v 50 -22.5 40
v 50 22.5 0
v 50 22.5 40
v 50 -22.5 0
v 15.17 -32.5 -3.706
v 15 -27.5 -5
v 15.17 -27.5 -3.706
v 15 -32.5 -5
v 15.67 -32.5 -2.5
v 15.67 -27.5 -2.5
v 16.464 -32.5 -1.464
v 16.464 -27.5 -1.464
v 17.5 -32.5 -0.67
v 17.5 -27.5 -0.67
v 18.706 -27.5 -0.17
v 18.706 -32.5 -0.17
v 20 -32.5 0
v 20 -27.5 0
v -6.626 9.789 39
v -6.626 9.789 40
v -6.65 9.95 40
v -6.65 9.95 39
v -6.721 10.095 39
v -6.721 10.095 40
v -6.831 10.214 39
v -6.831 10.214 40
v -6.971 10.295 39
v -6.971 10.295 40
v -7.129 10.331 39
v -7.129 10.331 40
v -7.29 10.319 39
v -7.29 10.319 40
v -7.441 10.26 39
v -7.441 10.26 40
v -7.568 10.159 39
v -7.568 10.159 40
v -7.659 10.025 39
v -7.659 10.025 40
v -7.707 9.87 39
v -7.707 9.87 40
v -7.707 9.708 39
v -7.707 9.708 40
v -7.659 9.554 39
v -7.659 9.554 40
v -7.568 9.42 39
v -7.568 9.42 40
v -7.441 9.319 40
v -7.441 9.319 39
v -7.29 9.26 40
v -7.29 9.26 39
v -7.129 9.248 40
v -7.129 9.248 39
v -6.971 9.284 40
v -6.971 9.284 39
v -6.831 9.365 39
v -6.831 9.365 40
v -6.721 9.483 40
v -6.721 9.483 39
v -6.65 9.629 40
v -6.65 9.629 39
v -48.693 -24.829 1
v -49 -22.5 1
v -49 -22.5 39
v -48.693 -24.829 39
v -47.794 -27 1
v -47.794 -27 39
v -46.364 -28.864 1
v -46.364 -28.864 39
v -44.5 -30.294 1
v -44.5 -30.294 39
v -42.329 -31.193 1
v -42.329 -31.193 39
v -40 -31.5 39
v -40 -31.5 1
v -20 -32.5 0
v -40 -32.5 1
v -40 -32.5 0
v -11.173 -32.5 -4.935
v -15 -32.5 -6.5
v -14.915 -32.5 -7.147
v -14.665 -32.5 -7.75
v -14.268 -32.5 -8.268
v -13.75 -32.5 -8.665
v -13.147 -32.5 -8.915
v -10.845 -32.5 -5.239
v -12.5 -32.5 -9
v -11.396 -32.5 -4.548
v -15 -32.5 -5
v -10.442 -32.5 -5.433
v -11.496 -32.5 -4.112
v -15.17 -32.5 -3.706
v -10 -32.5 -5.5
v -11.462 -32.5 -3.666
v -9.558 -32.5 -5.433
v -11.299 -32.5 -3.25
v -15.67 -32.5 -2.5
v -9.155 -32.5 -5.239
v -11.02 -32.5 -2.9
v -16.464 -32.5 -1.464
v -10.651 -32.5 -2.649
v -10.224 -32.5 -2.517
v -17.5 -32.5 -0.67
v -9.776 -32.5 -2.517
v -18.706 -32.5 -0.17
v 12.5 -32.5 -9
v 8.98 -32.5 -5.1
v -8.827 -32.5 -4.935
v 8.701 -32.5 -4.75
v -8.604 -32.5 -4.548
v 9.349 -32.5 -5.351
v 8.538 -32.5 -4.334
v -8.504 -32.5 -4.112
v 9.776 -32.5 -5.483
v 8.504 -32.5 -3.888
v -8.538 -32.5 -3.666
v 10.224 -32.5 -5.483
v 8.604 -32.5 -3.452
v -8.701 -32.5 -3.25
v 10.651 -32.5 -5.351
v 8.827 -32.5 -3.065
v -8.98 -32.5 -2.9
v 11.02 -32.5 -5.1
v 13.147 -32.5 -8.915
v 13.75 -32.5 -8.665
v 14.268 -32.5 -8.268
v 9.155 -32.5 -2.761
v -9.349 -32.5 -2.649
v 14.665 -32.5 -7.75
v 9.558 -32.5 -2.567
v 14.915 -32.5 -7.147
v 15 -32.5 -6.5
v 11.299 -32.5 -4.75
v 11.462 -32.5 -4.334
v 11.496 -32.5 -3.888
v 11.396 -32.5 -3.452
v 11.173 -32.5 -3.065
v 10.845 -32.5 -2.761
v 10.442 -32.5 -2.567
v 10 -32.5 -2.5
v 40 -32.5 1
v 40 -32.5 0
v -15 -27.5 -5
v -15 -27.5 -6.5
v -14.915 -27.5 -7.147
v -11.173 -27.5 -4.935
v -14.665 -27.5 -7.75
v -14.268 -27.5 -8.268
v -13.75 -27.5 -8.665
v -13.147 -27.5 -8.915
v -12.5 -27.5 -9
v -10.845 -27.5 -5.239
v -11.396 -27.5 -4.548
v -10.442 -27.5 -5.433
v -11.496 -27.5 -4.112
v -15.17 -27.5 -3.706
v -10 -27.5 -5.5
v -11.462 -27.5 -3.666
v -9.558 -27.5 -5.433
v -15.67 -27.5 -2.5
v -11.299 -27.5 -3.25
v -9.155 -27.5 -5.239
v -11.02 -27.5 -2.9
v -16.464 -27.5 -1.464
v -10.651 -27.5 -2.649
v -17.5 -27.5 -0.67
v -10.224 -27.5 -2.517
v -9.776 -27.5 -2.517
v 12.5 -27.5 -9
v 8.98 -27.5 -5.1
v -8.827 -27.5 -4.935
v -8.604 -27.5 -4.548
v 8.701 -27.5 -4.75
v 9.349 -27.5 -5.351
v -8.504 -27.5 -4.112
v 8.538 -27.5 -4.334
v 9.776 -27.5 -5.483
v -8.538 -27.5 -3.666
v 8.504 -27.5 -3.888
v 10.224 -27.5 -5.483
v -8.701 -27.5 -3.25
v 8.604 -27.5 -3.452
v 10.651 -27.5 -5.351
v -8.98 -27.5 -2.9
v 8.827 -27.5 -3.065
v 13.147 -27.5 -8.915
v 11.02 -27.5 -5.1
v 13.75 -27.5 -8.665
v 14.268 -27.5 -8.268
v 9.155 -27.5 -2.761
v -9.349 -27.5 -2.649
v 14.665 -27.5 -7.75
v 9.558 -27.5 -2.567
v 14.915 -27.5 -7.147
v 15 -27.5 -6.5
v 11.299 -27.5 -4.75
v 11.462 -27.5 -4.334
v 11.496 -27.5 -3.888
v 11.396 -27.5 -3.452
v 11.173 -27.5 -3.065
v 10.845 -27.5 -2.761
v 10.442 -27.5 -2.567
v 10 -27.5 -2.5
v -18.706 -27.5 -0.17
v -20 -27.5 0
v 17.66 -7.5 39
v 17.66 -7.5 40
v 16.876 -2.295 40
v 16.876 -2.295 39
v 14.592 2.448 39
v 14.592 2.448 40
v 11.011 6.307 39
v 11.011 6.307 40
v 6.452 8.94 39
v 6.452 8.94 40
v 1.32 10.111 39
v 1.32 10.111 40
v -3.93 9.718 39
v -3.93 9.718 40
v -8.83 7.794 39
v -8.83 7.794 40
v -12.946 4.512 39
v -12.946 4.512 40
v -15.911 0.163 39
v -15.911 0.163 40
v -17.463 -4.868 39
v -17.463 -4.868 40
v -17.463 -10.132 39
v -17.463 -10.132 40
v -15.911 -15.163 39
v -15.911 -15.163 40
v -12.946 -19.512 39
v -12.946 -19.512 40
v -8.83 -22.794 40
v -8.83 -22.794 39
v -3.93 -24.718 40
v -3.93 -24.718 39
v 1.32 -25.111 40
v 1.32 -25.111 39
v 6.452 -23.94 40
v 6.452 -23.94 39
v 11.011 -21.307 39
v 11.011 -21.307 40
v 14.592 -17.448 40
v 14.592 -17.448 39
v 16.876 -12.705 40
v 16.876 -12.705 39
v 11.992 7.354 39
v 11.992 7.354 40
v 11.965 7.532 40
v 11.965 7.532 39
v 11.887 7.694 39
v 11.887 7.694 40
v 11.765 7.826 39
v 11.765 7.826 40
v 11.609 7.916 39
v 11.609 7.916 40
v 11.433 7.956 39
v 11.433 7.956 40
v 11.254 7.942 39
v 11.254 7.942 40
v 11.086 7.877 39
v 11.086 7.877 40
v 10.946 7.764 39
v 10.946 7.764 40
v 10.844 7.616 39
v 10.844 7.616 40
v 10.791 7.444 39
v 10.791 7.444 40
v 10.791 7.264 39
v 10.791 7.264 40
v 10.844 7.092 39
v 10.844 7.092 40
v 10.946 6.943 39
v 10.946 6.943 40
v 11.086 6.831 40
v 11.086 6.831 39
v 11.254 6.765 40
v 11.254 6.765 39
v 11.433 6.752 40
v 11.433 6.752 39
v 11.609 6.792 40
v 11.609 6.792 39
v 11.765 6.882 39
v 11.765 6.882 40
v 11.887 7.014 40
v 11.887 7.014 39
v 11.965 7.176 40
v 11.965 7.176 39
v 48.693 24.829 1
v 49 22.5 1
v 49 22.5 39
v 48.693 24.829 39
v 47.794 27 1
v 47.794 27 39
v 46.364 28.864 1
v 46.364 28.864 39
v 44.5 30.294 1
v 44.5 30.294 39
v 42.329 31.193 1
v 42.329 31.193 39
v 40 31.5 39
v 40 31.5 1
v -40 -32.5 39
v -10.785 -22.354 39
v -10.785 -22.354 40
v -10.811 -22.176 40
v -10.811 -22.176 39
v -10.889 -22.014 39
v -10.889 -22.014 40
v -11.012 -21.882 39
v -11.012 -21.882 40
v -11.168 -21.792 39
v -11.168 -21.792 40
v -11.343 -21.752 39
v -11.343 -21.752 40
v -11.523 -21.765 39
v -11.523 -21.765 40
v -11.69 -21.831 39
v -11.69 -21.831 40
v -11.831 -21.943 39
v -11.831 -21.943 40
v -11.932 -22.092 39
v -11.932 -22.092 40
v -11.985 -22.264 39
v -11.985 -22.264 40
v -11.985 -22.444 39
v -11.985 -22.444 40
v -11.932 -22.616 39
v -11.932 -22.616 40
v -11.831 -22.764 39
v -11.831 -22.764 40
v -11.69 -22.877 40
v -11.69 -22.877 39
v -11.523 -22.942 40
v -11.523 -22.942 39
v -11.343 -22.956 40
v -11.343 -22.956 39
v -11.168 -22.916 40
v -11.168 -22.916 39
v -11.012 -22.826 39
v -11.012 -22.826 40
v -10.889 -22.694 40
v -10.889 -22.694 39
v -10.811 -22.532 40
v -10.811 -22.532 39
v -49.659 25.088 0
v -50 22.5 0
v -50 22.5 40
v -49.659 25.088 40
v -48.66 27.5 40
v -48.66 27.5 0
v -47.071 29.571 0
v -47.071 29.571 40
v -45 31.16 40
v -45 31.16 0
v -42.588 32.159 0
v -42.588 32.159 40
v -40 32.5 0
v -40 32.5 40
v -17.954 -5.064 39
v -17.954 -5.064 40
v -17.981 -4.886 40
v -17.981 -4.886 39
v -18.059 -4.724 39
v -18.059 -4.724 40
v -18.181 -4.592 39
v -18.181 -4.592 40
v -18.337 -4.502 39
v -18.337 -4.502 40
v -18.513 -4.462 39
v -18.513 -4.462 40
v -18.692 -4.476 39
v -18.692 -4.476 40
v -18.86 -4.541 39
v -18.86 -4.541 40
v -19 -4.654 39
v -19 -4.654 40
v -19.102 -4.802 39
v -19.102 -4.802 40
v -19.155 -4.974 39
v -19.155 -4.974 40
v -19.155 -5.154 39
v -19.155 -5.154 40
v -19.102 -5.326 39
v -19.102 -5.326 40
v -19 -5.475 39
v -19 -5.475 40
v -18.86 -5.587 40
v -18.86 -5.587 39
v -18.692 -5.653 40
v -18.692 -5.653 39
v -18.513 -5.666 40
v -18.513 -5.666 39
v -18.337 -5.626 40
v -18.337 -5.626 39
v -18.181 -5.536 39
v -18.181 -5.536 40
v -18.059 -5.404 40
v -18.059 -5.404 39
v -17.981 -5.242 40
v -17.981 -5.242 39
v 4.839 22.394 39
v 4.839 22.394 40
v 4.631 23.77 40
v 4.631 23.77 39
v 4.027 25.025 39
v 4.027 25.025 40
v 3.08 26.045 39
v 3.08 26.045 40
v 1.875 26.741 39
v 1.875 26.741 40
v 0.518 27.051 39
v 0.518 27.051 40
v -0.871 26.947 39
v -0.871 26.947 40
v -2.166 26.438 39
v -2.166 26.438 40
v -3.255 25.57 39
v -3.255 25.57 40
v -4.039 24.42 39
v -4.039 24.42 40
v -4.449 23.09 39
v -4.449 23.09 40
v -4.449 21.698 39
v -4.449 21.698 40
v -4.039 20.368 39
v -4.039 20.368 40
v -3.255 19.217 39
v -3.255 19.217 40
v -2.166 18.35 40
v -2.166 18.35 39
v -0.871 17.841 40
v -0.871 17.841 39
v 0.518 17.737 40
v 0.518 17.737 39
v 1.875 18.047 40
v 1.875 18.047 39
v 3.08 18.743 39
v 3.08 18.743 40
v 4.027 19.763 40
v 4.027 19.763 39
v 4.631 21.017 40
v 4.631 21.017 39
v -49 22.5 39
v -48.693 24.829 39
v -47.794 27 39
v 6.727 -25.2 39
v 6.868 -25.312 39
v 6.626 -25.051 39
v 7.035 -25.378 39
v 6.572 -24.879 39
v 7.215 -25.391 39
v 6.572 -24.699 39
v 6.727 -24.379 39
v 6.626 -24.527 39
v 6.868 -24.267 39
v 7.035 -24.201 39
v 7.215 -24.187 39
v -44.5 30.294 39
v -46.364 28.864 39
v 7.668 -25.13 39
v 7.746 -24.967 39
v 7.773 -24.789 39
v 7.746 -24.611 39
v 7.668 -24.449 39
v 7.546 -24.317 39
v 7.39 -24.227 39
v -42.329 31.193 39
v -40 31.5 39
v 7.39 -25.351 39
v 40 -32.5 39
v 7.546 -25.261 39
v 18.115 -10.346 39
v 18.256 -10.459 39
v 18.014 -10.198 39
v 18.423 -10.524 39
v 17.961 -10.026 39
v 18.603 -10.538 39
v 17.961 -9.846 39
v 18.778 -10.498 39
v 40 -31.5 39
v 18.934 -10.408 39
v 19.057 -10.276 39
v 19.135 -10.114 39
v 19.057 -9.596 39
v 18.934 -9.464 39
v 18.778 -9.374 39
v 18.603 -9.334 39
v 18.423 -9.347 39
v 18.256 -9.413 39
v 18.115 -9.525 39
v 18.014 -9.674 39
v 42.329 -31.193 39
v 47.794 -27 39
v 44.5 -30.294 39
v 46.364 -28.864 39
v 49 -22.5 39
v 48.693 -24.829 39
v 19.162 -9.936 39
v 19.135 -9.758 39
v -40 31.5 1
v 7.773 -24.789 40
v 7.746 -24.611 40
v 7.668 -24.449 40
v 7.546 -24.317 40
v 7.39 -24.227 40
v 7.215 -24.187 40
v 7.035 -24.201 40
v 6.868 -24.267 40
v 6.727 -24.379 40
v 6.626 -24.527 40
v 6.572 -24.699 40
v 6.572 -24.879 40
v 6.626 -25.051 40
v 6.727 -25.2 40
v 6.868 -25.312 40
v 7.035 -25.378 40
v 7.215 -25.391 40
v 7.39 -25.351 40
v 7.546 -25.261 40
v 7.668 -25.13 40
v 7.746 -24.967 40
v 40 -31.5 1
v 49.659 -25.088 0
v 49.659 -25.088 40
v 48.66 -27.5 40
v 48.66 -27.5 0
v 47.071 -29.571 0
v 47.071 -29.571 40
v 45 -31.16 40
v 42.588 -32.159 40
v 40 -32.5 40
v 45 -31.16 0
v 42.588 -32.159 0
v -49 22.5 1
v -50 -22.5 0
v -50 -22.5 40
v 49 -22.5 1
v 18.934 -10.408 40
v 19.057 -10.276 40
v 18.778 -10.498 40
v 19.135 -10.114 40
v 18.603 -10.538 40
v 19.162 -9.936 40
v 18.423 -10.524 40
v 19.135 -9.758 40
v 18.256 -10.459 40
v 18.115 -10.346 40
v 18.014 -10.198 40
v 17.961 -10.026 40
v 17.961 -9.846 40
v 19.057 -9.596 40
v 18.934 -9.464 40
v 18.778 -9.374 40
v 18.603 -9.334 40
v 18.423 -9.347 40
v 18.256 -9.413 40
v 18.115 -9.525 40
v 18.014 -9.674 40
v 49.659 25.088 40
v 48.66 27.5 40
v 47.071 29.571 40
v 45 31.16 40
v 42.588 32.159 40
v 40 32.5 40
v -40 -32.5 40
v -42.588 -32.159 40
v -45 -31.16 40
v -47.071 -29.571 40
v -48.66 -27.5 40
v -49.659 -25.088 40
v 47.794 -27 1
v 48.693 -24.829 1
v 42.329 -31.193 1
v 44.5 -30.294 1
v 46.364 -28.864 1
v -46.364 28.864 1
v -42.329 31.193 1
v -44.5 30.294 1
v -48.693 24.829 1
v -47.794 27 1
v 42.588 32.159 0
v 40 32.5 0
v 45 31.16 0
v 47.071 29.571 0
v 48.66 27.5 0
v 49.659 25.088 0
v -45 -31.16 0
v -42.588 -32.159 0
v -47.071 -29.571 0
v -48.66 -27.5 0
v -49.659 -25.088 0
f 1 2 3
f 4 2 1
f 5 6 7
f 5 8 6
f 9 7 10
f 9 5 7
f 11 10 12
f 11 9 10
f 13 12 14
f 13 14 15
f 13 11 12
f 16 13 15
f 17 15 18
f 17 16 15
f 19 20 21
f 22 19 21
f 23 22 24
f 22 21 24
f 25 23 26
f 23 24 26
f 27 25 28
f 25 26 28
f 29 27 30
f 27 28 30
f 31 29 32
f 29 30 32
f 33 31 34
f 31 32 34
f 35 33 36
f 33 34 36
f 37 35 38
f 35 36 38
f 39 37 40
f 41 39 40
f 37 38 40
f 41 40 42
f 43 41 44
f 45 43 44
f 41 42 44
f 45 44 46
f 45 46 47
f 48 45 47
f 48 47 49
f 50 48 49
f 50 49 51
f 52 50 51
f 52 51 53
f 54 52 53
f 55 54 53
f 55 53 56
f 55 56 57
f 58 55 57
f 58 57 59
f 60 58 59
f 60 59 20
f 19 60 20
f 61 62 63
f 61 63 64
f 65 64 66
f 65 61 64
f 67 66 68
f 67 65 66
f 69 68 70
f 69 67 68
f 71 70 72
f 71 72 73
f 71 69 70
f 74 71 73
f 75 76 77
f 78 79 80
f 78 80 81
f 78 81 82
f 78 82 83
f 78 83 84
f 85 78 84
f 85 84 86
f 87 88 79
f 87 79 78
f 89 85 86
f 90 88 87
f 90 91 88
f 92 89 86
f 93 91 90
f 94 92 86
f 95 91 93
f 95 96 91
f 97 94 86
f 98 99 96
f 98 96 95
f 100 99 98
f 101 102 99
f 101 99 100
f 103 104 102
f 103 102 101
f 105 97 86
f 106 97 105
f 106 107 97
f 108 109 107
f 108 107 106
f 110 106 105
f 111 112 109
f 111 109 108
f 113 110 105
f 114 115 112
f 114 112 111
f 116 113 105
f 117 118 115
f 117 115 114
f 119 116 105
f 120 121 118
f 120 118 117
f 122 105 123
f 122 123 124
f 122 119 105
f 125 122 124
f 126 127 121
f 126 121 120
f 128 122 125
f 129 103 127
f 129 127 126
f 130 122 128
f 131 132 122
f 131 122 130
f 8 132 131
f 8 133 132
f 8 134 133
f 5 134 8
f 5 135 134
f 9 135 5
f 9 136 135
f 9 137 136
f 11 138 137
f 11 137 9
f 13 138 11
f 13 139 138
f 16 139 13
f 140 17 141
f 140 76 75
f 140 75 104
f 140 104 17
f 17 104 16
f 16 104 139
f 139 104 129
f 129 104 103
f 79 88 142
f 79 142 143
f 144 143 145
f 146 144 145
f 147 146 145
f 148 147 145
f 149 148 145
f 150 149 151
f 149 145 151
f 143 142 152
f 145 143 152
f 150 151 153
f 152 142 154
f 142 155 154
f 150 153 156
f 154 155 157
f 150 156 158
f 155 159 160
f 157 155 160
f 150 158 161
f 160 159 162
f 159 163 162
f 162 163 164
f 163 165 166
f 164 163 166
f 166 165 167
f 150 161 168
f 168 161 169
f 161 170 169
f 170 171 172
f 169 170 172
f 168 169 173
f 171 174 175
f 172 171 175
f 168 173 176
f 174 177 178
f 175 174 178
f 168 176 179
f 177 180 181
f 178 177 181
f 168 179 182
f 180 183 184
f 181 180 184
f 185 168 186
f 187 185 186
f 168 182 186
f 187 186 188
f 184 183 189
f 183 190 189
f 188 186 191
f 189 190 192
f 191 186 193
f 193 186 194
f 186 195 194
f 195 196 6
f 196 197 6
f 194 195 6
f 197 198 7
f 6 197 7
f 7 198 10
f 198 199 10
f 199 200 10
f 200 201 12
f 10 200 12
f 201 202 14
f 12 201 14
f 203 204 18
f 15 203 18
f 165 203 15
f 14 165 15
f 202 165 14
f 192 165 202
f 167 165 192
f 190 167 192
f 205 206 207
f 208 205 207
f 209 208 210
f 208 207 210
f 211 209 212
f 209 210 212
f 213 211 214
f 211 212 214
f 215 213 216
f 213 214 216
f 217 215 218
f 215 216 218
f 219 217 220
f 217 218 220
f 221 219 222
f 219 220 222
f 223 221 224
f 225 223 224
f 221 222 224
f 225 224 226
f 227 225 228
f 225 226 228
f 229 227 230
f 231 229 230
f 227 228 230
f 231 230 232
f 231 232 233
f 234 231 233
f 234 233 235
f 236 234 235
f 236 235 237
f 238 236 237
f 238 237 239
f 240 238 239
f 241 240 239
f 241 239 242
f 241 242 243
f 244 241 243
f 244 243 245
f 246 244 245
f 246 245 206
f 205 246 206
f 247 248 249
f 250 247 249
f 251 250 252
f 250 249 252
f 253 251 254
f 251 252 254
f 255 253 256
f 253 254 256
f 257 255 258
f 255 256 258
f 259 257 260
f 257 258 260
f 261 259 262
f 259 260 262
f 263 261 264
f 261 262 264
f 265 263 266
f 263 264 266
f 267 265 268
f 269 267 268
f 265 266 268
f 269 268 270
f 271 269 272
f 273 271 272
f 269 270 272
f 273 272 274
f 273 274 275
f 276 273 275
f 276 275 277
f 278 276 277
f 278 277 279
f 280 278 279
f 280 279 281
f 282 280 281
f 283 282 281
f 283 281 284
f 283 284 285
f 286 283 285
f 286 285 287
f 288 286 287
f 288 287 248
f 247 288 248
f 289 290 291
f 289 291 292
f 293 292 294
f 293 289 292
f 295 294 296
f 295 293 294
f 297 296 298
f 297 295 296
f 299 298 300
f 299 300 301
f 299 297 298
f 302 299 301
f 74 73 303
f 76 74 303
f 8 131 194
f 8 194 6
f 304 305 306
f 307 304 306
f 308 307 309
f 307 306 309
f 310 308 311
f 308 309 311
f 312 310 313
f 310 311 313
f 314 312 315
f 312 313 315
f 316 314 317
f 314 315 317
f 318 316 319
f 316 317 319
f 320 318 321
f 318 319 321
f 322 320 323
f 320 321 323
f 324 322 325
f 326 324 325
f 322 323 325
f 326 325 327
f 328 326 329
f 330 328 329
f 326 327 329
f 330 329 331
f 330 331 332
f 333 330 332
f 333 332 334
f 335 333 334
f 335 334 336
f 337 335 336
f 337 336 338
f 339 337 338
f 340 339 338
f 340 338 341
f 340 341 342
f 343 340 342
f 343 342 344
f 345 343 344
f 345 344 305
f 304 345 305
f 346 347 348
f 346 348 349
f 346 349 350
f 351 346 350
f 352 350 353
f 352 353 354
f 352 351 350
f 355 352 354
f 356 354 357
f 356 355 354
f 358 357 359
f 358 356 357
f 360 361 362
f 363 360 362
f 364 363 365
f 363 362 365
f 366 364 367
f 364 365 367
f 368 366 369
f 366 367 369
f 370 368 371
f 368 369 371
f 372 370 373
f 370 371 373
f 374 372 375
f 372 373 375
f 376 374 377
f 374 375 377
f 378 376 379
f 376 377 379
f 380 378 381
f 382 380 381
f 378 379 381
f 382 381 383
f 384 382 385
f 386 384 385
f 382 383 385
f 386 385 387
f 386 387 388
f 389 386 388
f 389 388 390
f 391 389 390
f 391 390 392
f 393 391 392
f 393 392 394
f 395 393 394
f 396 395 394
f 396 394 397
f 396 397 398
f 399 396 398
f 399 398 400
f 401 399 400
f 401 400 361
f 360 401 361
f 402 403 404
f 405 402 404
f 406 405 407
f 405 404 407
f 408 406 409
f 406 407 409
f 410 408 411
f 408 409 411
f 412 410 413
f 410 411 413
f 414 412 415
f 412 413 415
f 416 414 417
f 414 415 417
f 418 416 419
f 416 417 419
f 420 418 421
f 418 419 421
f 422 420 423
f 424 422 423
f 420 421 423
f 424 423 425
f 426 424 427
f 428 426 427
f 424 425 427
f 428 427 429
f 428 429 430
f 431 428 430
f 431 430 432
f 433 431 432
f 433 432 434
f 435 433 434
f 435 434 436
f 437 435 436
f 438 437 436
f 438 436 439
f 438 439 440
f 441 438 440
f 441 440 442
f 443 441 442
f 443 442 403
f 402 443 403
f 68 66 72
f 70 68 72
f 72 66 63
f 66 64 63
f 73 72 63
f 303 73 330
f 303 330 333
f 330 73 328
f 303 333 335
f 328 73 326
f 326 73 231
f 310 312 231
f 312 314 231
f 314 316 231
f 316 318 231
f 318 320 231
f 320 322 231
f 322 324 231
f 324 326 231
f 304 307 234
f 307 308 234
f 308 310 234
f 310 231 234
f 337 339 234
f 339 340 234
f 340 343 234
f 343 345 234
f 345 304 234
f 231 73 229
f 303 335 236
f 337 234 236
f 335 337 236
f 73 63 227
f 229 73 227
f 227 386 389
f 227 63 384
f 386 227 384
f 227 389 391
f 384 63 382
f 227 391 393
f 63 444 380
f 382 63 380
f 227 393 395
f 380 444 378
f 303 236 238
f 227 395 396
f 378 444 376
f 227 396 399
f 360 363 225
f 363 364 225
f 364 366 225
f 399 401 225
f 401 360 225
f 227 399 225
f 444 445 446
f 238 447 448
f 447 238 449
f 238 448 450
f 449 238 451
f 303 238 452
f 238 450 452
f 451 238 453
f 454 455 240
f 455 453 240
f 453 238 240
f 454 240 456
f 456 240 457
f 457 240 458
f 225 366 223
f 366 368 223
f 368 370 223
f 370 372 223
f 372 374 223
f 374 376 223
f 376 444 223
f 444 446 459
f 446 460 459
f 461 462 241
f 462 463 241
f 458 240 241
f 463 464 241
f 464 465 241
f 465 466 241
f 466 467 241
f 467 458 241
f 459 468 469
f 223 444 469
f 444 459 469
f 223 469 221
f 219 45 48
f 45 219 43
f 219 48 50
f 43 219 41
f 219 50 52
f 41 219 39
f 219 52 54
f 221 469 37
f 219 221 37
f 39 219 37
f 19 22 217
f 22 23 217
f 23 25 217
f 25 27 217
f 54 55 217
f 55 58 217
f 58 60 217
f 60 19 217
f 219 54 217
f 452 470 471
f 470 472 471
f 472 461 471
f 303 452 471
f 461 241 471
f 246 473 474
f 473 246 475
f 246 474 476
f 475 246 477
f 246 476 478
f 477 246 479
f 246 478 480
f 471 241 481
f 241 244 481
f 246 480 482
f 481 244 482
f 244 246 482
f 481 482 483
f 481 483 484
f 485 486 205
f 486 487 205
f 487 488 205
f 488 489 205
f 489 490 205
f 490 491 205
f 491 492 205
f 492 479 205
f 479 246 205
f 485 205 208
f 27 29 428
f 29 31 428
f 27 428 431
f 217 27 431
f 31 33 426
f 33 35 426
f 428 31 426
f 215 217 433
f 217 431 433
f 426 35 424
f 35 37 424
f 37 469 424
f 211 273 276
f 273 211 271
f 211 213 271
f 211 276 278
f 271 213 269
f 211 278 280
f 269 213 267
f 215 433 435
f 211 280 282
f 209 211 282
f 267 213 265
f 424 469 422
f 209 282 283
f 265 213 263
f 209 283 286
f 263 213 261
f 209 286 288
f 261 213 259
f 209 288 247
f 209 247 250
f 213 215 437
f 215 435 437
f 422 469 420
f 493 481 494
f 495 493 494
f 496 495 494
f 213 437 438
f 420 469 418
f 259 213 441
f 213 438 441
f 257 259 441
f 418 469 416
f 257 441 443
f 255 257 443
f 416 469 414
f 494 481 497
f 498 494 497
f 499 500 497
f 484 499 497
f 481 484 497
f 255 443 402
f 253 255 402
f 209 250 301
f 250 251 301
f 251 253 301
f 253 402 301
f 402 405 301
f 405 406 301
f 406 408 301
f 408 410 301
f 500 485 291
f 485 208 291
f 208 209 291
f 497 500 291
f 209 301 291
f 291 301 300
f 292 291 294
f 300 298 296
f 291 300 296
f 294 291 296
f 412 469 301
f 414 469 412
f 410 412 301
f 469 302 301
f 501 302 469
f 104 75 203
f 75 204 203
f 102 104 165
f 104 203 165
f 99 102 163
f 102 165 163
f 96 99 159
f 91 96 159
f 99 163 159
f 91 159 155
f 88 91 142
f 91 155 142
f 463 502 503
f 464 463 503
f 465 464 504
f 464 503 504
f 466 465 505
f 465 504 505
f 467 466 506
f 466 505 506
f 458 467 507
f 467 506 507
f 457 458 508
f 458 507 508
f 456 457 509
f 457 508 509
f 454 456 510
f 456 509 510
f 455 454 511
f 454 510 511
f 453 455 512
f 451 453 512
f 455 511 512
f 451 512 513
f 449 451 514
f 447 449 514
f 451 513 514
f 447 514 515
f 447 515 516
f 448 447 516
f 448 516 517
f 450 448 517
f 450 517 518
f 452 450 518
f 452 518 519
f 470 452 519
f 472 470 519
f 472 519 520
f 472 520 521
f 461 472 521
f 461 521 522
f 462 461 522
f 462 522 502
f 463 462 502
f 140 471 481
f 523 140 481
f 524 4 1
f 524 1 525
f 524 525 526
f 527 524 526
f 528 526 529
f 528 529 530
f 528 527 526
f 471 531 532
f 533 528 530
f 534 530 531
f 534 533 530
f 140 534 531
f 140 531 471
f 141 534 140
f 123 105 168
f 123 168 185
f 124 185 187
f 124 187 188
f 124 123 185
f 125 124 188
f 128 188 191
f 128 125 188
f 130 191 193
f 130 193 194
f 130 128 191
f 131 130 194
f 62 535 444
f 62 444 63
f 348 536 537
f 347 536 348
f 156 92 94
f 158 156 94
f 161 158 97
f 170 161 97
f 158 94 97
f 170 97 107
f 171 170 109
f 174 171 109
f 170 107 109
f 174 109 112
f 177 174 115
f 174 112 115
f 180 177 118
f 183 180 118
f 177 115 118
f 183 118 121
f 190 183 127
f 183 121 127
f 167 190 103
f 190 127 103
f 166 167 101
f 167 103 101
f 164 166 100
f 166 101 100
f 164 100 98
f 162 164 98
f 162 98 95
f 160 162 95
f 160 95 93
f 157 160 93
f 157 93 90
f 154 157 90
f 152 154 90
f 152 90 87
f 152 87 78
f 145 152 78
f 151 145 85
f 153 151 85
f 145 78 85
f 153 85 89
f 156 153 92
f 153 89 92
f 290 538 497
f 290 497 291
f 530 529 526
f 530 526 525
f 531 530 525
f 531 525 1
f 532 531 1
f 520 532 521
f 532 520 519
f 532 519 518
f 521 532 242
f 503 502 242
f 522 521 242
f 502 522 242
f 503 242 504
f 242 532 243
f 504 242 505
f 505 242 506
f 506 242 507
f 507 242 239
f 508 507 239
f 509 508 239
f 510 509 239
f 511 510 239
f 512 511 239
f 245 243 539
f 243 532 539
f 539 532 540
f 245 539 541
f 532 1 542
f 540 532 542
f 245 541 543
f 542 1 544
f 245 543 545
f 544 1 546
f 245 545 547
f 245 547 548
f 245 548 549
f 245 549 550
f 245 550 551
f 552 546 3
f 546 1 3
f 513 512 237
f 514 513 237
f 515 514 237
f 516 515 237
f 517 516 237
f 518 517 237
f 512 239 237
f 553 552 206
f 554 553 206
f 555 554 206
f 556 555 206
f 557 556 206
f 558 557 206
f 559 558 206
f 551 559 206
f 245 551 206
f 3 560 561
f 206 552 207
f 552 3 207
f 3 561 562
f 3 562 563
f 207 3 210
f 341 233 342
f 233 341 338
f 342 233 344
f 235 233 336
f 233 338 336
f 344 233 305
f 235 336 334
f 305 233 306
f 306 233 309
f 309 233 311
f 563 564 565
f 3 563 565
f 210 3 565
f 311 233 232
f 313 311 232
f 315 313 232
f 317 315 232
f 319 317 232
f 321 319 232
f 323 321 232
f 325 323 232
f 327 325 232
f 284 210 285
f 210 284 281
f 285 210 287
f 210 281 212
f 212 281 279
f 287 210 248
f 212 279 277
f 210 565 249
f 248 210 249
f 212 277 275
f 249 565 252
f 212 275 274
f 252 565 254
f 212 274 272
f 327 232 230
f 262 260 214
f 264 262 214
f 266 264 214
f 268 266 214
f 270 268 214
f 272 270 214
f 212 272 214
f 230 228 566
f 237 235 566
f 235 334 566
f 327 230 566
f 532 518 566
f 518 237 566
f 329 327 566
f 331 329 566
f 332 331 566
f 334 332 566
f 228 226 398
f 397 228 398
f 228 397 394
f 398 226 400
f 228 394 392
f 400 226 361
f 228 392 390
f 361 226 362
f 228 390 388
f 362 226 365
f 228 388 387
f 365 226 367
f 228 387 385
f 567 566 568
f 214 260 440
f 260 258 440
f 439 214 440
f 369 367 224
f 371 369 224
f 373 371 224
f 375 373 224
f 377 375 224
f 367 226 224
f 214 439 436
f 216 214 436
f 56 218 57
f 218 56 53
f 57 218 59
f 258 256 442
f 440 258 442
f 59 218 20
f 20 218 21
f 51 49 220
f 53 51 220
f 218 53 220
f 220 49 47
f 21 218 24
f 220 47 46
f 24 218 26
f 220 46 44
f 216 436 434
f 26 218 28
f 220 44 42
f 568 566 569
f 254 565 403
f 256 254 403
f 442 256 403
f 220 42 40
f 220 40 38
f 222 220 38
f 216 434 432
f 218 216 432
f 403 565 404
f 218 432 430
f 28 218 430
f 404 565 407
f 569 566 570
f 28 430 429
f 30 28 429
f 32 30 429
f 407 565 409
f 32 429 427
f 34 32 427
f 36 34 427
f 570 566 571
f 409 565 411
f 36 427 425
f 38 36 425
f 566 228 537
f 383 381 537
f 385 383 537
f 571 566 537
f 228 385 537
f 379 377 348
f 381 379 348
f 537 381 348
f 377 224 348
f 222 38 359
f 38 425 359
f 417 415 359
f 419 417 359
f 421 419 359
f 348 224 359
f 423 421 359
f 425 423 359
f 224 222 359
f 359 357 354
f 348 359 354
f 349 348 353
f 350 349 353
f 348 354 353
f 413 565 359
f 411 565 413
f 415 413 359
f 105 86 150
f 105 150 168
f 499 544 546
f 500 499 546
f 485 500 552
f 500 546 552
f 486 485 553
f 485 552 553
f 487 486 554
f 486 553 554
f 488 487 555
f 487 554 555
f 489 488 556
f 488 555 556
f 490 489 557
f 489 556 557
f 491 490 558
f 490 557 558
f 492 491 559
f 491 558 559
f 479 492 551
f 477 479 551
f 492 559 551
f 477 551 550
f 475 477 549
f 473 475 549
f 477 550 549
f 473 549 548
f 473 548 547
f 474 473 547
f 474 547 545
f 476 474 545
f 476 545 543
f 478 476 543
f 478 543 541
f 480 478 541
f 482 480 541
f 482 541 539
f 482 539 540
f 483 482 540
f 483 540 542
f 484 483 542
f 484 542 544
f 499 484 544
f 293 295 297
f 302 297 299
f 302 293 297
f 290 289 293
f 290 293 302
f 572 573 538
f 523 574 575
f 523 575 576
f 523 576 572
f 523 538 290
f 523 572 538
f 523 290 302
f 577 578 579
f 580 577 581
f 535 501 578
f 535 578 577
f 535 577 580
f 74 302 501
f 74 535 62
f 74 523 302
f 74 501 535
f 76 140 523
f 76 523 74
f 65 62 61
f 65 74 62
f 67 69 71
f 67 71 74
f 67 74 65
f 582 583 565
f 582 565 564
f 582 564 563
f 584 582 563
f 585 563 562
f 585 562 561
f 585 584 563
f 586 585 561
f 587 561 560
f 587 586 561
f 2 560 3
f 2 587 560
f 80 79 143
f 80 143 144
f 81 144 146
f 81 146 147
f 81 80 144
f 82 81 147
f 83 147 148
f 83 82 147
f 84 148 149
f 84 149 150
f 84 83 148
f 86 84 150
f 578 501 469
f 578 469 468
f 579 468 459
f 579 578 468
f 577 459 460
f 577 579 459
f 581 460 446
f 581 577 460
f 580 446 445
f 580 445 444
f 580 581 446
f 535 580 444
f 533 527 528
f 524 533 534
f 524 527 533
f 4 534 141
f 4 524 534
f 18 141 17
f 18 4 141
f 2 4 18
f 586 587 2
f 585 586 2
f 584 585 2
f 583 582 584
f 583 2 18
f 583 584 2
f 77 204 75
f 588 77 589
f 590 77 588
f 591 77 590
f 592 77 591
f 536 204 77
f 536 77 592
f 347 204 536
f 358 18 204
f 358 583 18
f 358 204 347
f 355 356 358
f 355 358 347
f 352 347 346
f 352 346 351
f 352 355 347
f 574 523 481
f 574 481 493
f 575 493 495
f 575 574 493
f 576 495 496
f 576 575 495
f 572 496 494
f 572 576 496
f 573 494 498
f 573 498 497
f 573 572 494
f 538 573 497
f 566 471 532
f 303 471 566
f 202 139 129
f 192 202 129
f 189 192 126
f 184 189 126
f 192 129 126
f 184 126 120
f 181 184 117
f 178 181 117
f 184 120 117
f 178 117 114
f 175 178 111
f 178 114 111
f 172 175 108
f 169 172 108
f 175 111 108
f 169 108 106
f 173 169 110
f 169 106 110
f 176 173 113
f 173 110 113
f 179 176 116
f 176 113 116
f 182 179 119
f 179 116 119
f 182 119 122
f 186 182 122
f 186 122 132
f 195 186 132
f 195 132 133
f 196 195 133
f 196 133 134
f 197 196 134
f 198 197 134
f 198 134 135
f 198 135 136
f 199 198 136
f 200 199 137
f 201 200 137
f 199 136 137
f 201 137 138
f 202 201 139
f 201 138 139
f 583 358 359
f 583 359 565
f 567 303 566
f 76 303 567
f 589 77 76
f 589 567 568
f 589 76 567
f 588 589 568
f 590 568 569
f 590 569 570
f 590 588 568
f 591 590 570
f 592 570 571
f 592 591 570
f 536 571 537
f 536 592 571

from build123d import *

# Parameters (mm, degrees)
BOSS_EXTRU_1_DEPTH      = 40
COQUE1_START            = 1
COQUE1_DEPTH            = 38
ESQUISSE2_R             = 4.67
ESQUISSE2_R_2           = 17.660377339
ESQUISSE2_R_3           = 0.603773585
ESQUISSE2_R_4           = 0.543253327
ENL_V_MAT_EXTRU_1_DEPTH = 5
ESQUISSE3_R             = 1.5
BOSS_EXTRU_2_DEPTH      = 5
CONG_1_R                = 5


# Read off the part's stored shape, not the designer's step: Coque1
with BuildPart() as part:
    # Esquisse1 → Boss.-Extru.1 (new body)
    with BuildSketch(Plane.XY):
        with BuildLine():
            Line((-40, 32.5), (40, 32.5))
            ThreePointArc((40, 32.5), (47.071067812, 29.571067812), (50, 22.5))
            Line((50, 22.5), (50, -22.5))
            ThreePointArc((50, -22.5), (47.071067812, -29.571067812), (40, -32.5))
            Line((40, -32.5), (-40, -32.5))
            ThreePointArc((-40, -32.5), (-47.071067812, -29.571067812), (-50, -22.5))
            Line((-50, -22.5), (-50, 22.5))
            ThreePointArc((-50, 22.5), (-47.071067812, 29.571067812), (-40, 32.5))
        make_face()
    extrude(amount=BOSS_EXTRU_1_DEPTH)

    # Coque1 outline → Coque1 (cut)
    with BuildSketch(Plane.XY.offset(COQUE1_START)):
        with BuildLine():
            Line((-40, -31.5), (-40, -32.5))
            Line((-40, -32.5), (40, -32.5))
            Line((40, -32.5), (40, -31.5))
            ThreePointArc((40, -31.5), (46.363961031, -28.863961031), (49, -22.5))
            Line((49, -22.5), (49, 22.5))
            ThreePointArc((49, 22.5), (46.363961031, 28.863961031), (40, 31.5))
            Line((40, 31.5), (-40, 31.5))
            ThreePointArc((-40, 31.5), (-46.363961031, 28.863961031), (-49, 22.5))
            Line((-49, 22.5), (-49, -22.5))
            ThreePointArc((-49, -22.5), (-46.363961031, -28.863961031), (-40, -31.5))
        make_face()
    extrude(amount=COQUE1_DEPTH, mode=Mode.SUBTRACT)

    # Esquisse2 → Enlèv. mat.-Extru.1 (cut)
    with BuildSketch(Plane.XY.offset(40)):
        with Locations((0.168563894, 22.39389783)):
            Circle(ESQUISSE2_R)
        with Locations((-2.4e-08, -7.499999903)):
            Circle(ESQUISSE2_R_2)
        with Locations((-18.557820098, -5.064287395)):
            Circle(ESQUISSE2_R_3)
        with Locations((18.557820098, -9.935712605)):
            Circle(ESQUISSE2_R_3)
        with Locations((11.388299042, 7.353687341)):
            Circle(ESQUISSE2_R_3)
        with Locations((-7.169521057, 9.789399947)):
            Circle(ESQUISSE2_R_4)
        with Locations((7.169521057, -24.789399947)):
            Circle(ESQUISSE2_R_3)
        with Locations((-11.388299042, -22.353687341)):
            Circle(ESQUISSE2_R_3)
    extrude(amount=-ENL_V_MAT_EXTRU_1_DEPTH, mode=Mode.SUBTRACT)

    # Esquisse3 → Boss.-Extru.2 (add)
    with BuildSketch(Plane.XZ.offset(32.5)):
        with BuildLine():
            Line((-12.5, -9), (12.5, -9))
            ThreePointArc((12.5, -9), (14.267766953, -8.267766953), (15, -6.5))
            Line((15, -6.5), (15, 1))
            Line((15, 1), (-15, 1))
            Line((-15, 1), (-15, -6.5))
            ThreePointArc((-15, -6.5), (-14.267766953, -8.267766953), (-12.5, -9))
        make_face()
        with Locations(Location((-10, -4, 0), (0, 0, 270))):
            Circle(ESQUISSE3_R, mode=Mode.SUBTRACT)
        with Locations(Location((10, -4, 0), (0, 0, 90))):
            Circle(ESQUISSE3_R, mode=Mode.SUBTRACT)
    extrude(amount=-BOSS_EXTRU_2_DEPTH)

    # Congé1
    cong_1_edges = [part.edges().sort_by_distance(p)[0] for p in [
        (-15, -30, 0),
        (15, -30, 0),
    ]]
    fillet(cong_1_edges, radius=CONG_1_R)


solid = part.part
